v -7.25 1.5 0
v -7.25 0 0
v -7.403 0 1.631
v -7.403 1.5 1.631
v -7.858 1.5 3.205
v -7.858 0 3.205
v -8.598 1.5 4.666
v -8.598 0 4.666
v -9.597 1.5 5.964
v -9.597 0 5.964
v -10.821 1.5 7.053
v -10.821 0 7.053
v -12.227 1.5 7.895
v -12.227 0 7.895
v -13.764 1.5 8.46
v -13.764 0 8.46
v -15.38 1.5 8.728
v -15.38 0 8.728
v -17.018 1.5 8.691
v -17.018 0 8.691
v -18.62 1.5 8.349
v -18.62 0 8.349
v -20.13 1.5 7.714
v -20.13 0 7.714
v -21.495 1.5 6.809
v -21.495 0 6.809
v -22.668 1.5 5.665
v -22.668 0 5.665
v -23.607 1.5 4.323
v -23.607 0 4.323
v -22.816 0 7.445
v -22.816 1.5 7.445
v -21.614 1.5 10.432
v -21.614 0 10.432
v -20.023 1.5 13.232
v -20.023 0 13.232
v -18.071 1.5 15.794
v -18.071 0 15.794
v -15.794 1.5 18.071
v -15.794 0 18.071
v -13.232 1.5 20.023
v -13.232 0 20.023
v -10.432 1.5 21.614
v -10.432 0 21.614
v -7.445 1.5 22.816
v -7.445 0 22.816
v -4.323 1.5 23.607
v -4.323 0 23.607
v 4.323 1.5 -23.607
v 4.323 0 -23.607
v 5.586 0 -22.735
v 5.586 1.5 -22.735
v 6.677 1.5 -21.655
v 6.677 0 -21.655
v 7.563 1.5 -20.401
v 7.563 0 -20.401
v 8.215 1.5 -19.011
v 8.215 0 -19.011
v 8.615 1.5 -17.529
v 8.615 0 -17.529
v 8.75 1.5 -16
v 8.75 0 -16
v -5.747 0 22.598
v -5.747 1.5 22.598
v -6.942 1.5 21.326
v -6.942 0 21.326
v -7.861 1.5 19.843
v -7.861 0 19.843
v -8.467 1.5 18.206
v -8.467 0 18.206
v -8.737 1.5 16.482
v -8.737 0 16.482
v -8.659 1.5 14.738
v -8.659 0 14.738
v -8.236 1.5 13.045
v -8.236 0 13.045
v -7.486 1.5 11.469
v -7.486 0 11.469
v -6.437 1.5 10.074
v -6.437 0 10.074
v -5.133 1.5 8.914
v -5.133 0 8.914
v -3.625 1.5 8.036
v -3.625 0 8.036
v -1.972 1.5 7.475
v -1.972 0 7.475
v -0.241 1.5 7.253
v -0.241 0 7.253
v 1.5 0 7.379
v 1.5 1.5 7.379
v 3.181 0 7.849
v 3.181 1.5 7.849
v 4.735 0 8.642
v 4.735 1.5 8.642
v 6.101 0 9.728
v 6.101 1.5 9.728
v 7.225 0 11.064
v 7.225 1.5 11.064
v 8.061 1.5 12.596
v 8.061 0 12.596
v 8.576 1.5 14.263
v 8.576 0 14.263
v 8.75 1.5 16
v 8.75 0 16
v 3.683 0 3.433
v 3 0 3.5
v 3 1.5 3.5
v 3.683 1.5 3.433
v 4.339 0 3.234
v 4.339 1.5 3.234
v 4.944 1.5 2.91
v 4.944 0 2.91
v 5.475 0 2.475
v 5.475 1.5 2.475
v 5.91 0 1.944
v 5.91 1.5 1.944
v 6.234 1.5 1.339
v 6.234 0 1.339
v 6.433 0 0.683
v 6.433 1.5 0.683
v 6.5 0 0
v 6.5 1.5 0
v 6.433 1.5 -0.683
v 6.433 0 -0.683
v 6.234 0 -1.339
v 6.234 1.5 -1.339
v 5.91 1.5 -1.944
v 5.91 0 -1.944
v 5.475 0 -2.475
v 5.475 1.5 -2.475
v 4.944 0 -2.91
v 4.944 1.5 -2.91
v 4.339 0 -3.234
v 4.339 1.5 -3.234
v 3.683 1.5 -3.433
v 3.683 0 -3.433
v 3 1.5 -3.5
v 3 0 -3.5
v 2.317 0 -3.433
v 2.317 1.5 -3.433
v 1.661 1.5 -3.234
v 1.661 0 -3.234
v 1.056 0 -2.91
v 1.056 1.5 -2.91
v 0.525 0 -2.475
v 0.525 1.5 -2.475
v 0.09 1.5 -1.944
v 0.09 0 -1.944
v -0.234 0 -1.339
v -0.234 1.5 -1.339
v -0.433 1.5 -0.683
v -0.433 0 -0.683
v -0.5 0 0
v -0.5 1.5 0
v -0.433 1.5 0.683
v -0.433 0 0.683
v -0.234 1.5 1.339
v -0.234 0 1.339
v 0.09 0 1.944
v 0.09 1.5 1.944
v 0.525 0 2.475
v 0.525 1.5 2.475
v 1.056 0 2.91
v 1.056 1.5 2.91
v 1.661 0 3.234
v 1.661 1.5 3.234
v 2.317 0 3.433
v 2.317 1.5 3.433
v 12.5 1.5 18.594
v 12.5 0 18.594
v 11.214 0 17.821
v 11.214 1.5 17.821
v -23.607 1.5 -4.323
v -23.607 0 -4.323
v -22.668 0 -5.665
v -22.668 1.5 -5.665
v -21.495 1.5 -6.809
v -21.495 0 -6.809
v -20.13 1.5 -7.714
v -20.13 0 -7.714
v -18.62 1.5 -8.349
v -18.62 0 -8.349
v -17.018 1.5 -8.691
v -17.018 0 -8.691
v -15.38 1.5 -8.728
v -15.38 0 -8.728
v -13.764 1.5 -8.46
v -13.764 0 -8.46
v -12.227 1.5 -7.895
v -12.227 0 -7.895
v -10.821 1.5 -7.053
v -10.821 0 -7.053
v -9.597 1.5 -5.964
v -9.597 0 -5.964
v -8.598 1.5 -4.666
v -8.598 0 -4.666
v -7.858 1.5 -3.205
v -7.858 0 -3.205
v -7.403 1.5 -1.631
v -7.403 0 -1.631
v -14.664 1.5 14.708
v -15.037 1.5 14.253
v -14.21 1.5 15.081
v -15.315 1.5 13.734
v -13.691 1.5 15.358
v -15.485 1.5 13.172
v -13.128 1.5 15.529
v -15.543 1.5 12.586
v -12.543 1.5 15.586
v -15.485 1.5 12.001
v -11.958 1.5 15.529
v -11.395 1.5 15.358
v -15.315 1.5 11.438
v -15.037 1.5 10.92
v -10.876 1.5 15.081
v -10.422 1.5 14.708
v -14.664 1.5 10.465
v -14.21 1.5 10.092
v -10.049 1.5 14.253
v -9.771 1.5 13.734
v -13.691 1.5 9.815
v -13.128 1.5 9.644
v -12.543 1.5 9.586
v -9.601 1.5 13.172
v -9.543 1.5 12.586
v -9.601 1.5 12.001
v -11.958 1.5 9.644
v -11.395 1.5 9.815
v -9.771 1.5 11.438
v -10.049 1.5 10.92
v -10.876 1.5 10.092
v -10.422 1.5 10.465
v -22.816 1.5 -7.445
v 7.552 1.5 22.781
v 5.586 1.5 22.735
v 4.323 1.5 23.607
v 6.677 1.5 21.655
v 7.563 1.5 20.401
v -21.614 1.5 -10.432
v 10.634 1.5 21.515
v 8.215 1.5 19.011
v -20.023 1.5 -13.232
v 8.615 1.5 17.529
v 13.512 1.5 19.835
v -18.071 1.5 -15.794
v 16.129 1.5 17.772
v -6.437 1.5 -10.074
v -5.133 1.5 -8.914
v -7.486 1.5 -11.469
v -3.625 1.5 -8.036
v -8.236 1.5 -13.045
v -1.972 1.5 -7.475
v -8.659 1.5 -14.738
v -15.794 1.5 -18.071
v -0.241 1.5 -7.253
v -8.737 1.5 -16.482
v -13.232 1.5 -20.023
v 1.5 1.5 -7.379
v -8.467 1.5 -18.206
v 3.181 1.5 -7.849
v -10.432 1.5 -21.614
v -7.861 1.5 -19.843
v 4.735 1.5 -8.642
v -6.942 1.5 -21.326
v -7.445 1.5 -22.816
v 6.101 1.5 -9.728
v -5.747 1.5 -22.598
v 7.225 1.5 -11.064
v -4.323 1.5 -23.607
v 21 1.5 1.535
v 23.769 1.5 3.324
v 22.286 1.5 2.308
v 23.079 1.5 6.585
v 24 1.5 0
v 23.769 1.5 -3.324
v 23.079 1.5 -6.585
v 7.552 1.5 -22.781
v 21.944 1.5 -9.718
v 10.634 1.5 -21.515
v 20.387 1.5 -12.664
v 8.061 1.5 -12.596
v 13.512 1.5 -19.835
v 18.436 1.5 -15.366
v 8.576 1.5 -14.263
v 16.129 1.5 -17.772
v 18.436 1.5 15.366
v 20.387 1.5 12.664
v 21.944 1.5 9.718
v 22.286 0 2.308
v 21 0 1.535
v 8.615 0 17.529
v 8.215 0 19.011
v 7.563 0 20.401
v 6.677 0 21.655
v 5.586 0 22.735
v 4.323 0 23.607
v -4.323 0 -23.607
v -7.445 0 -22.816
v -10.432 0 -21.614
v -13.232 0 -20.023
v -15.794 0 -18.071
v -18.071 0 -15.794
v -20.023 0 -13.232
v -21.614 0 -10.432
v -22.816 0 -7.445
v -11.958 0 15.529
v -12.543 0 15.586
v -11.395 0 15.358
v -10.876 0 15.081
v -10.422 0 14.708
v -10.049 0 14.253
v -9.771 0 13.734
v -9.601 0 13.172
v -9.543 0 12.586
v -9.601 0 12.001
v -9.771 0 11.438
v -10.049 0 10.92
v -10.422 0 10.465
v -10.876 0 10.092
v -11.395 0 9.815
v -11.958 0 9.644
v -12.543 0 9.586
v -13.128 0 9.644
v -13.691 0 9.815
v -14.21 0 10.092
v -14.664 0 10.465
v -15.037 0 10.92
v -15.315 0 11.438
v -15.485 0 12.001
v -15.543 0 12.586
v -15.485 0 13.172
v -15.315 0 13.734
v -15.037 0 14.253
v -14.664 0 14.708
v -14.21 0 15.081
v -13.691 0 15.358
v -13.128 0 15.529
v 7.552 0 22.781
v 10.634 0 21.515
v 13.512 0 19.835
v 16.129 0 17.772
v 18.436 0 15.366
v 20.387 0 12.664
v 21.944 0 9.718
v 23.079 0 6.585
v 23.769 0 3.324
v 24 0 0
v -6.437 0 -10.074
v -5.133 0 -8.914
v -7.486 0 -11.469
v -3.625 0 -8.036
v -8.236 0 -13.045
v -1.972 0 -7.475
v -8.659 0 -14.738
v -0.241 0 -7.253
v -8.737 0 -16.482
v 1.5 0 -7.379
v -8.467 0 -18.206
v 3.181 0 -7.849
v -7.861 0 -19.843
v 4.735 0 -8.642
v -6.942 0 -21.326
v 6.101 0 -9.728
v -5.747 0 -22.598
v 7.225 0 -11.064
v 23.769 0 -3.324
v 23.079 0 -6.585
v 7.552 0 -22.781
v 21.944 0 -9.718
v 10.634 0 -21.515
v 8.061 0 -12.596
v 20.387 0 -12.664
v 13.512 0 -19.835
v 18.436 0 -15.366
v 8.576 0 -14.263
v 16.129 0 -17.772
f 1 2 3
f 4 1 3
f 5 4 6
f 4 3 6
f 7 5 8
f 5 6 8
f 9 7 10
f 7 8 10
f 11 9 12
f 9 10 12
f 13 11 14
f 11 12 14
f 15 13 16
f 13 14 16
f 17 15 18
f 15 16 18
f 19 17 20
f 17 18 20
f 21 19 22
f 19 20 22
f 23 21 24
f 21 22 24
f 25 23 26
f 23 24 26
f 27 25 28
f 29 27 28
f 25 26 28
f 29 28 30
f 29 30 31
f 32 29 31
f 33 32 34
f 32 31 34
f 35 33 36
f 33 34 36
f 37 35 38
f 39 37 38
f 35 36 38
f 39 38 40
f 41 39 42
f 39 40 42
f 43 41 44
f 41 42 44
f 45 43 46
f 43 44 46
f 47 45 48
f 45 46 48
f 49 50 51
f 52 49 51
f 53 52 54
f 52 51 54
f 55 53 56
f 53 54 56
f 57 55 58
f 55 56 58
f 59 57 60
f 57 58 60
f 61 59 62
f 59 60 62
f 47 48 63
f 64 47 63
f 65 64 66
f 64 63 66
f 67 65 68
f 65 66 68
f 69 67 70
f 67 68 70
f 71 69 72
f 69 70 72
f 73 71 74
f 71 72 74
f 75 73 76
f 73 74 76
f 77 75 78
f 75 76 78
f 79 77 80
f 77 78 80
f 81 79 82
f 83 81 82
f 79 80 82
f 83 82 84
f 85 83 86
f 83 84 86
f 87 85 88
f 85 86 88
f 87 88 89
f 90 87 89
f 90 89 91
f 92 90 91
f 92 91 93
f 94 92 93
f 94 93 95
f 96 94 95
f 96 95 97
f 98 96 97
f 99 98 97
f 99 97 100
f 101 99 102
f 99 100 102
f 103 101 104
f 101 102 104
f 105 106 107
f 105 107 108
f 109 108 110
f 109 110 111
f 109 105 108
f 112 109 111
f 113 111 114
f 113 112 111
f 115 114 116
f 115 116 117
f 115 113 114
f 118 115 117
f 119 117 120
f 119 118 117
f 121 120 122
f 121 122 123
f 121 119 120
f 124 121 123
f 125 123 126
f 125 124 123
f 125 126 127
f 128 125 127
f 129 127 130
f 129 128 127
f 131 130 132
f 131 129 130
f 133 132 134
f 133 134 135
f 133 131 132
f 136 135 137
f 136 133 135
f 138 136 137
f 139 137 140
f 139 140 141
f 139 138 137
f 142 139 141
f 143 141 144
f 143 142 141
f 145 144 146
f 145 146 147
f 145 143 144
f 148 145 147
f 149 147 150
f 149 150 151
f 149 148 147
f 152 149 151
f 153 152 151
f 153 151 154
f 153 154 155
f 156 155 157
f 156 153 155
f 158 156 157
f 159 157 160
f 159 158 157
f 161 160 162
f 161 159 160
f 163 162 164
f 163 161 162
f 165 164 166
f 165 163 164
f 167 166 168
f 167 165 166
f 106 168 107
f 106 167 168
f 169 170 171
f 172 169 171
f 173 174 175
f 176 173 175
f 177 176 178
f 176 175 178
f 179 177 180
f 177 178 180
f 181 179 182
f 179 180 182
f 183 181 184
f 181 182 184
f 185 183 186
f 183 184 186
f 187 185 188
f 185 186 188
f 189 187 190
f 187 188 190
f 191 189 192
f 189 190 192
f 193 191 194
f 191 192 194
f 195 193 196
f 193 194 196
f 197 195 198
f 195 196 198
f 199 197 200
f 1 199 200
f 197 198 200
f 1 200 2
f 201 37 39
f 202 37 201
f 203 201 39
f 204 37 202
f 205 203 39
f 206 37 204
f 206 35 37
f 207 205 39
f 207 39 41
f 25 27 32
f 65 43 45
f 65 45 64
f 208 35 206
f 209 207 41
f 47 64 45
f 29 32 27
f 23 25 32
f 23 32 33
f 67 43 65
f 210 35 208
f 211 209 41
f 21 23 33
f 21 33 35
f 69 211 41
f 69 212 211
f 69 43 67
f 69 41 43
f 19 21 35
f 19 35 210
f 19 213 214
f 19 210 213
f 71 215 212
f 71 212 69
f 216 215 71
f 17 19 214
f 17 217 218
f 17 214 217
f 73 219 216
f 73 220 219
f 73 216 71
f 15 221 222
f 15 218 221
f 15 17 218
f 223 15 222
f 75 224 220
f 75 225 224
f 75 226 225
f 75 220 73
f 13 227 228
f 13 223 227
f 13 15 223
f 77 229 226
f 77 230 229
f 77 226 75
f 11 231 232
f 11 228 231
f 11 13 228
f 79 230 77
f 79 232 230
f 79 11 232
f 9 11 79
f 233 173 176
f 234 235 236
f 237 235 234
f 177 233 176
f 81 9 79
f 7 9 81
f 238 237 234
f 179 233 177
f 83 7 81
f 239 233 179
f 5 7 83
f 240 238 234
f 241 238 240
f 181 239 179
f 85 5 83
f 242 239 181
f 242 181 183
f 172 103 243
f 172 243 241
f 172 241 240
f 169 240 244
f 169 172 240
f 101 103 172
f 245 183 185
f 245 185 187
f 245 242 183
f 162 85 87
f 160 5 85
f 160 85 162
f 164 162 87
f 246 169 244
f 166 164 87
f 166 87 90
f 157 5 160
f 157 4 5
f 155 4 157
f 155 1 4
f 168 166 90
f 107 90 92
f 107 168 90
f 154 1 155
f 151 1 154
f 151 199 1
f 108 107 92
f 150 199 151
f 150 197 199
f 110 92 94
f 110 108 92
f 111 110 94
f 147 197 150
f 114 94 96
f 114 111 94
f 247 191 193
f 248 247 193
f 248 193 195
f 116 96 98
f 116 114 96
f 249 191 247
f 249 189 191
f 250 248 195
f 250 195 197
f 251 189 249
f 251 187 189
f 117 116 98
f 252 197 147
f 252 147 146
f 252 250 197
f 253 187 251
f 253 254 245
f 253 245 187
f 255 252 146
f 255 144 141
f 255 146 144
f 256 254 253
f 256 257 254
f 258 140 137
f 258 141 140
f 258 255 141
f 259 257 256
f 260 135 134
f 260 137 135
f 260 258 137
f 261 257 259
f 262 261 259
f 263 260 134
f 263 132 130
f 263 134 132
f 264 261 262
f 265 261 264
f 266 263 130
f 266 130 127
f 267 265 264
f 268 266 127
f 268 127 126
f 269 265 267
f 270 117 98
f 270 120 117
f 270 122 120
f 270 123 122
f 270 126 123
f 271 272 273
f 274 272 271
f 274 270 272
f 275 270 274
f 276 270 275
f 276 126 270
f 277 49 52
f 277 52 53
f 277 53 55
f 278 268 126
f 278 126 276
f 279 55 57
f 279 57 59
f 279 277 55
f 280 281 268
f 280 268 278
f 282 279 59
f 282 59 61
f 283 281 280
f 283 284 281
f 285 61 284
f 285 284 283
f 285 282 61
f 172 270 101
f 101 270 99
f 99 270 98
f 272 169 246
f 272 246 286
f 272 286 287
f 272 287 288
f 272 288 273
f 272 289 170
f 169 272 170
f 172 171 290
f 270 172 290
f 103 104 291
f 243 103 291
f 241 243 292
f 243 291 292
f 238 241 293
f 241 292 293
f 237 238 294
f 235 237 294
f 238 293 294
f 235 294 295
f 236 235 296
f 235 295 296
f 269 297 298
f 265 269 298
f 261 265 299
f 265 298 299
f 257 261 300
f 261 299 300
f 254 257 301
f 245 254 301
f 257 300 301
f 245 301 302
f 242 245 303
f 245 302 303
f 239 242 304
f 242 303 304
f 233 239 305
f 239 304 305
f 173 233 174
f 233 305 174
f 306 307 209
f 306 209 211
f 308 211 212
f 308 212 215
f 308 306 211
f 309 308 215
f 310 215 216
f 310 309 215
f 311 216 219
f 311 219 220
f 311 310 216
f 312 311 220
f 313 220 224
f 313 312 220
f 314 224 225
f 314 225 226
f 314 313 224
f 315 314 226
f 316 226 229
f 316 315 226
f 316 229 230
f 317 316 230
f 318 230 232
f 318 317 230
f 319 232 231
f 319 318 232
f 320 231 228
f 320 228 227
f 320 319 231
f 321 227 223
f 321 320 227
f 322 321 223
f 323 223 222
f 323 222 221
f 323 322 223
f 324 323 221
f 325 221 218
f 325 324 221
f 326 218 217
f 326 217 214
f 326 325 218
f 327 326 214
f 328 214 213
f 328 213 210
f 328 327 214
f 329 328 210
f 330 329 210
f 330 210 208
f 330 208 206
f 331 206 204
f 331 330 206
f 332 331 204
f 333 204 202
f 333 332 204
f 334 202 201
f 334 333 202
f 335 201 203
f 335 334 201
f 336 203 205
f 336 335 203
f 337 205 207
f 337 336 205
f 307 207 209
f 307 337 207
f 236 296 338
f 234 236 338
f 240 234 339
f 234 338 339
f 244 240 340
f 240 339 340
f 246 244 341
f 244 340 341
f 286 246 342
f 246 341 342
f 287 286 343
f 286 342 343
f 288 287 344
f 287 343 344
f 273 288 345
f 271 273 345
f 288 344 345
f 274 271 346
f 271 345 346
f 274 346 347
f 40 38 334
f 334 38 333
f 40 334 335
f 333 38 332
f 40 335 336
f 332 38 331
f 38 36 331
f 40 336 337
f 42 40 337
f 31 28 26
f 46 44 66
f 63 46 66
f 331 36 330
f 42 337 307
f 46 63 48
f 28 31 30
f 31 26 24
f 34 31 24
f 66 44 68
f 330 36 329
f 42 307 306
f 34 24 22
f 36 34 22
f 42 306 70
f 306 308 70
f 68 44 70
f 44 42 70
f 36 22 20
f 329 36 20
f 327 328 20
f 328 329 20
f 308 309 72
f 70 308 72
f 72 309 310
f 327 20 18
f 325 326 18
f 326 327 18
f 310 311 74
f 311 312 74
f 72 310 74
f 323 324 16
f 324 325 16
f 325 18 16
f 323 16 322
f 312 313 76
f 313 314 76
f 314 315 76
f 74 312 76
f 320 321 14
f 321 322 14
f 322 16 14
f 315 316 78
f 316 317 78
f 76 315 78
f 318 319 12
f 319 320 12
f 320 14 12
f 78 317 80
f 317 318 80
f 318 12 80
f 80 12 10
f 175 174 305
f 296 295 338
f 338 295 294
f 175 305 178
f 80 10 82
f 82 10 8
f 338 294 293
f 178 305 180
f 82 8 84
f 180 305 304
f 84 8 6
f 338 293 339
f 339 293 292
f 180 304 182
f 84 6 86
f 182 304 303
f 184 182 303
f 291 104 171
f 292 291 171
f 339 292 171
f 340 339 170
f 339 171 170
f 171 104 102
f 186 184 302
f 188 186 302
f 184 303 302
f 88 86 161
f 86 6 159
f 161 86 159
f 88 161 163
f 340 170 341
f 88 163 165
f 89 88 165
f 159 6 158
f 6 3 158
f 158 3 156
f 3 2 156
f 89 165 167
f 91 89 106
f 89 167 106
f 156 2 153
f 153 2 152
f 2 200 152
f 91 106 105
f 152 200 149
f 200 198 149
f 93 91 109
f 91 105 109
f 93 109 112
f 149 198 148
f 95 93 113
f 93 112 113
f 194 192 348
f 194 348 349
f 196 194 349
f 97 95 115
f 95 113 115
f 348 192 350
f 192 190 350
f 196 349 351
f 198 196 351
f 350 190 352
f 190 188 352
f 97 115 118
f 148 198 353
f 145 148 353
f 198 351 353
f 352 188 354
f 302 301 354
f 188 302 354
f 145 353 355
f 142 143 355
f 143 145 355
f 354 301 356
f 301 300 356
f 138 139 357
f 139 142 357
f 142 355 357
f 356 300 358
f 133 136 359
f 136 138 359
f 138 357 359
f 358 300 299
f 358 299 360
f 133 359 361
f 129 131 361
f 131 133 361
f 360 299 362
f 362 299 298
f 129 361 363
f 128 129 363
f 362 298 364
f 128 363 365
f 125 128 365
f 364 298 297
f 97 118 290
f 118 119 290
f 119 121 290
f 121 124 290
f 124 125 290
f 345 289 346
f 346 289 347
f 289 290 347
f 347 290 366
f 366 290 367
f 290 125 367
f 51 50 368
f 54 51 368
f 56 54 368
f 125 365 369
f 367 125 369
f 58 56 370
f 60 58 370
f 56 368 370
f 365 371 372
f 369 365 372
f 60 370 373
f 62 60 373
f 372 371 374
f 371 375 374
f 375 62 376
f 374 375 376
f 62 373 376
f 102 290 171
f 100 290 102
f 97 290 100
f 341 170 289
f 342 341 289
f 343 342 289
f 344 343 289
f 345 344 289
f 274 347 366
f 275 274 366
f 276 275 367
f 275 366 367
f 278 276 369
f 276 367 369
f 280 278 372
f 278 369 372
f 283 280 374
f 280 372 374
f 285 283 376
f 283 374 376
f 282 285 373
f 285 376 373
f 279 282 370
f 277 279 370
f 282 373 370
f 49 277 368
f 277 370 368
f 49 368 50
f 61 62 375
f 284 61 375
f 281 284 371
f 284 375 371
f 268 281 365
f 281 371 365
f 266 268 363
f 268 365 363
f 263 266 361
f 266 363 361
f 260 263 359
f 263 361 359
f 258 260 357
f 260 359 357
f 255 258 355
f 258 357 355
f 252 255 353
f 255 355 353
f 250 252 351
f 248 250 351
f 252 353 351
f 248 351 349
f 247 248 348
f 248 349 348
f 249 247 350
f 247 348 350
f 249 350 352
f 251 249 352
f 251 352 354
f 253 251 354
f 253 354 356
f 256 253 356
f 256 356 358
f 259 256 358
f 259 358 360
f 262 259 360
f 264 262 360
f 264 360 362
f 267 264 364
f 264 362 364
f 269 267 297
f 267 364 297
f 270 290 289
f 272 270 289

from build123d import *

# Parameters (mm, degrees)
ESQUISSE1_R        = 3
ESQUISSE1_R_2      = 3.5
BOSS_EXTRU_1_DEPTH = 1.5


with BuildPart() as part:
    # Esquisse1 → Boss.-Extru.1 (new body)
    with BuildSketch(Plane(origin=(0, 0, 0), x_dir=(1, 0, 0), z_dir=(0, 1, 0))):
        with BuildLine():
            ThreePointArc((4.323150751, -23.607421875), (18.435775248, -15.366267959), (24, 0))
            ThreePointArc((24, 0), (18.435775248, 15.366267959), (4.323150751, 23.607421875))
            ThreePointArc((4.323150751, 23.607421875), (7.562739883, 20.400848266), (8.75, 16))
            ThreePointArc((8.75, 16), (-4.400848266, 8.437260117), (-4.323150751, 23.607421875))
            ThreePointArc((-4.323150751, 23.607421875), (-16.970562748, 16.970562748), (-23.607421875, 4.323150751))
            ThreePointArc((-23.607421875, 4.323150751), (-13.764204997, 8.459534308), (-7.25, 0))
            ThreePointArc((-7.25, 0), (-13.764204997, -8.459534308), (-23.607421875, -4.323150751))
            ThreePointArc((-23.607421875, -4.323150751), (-16.970562748, -16.970562748), (-4.323150751, -23.607421875))
            ThreePointArc((-4.323150751, -23.607421875), (-4.400848266, -8.437260117), (8.75, -16))
            ThreePointArc((8.75, -16), (7.562739883, -20.400848266), (4.323150751, -23.607421875))
        make_face()
        with Locations(Location((-12.542919229, -12.586407821, 0), (0, 0, 270))):
            Circle(ESQUISSE1_R, mode=Mode.SUBTRACT)
        Polygon((11.214276577, -17.821234439), (21, -1.535055726), (22.285750951, -2.307612838), (12.500027528, -18.593791552), align=None, mode=Mode.SUBTRACT)
        with Locations(Location((3, 0, 0), (0, 0, 270))):
            Circle(ESQUISSE1_R_2, mode=Mode.SUBTRACT)
    extrude(amount=BOSS_EXTRU_1_DEPTH)


solid = part.part
